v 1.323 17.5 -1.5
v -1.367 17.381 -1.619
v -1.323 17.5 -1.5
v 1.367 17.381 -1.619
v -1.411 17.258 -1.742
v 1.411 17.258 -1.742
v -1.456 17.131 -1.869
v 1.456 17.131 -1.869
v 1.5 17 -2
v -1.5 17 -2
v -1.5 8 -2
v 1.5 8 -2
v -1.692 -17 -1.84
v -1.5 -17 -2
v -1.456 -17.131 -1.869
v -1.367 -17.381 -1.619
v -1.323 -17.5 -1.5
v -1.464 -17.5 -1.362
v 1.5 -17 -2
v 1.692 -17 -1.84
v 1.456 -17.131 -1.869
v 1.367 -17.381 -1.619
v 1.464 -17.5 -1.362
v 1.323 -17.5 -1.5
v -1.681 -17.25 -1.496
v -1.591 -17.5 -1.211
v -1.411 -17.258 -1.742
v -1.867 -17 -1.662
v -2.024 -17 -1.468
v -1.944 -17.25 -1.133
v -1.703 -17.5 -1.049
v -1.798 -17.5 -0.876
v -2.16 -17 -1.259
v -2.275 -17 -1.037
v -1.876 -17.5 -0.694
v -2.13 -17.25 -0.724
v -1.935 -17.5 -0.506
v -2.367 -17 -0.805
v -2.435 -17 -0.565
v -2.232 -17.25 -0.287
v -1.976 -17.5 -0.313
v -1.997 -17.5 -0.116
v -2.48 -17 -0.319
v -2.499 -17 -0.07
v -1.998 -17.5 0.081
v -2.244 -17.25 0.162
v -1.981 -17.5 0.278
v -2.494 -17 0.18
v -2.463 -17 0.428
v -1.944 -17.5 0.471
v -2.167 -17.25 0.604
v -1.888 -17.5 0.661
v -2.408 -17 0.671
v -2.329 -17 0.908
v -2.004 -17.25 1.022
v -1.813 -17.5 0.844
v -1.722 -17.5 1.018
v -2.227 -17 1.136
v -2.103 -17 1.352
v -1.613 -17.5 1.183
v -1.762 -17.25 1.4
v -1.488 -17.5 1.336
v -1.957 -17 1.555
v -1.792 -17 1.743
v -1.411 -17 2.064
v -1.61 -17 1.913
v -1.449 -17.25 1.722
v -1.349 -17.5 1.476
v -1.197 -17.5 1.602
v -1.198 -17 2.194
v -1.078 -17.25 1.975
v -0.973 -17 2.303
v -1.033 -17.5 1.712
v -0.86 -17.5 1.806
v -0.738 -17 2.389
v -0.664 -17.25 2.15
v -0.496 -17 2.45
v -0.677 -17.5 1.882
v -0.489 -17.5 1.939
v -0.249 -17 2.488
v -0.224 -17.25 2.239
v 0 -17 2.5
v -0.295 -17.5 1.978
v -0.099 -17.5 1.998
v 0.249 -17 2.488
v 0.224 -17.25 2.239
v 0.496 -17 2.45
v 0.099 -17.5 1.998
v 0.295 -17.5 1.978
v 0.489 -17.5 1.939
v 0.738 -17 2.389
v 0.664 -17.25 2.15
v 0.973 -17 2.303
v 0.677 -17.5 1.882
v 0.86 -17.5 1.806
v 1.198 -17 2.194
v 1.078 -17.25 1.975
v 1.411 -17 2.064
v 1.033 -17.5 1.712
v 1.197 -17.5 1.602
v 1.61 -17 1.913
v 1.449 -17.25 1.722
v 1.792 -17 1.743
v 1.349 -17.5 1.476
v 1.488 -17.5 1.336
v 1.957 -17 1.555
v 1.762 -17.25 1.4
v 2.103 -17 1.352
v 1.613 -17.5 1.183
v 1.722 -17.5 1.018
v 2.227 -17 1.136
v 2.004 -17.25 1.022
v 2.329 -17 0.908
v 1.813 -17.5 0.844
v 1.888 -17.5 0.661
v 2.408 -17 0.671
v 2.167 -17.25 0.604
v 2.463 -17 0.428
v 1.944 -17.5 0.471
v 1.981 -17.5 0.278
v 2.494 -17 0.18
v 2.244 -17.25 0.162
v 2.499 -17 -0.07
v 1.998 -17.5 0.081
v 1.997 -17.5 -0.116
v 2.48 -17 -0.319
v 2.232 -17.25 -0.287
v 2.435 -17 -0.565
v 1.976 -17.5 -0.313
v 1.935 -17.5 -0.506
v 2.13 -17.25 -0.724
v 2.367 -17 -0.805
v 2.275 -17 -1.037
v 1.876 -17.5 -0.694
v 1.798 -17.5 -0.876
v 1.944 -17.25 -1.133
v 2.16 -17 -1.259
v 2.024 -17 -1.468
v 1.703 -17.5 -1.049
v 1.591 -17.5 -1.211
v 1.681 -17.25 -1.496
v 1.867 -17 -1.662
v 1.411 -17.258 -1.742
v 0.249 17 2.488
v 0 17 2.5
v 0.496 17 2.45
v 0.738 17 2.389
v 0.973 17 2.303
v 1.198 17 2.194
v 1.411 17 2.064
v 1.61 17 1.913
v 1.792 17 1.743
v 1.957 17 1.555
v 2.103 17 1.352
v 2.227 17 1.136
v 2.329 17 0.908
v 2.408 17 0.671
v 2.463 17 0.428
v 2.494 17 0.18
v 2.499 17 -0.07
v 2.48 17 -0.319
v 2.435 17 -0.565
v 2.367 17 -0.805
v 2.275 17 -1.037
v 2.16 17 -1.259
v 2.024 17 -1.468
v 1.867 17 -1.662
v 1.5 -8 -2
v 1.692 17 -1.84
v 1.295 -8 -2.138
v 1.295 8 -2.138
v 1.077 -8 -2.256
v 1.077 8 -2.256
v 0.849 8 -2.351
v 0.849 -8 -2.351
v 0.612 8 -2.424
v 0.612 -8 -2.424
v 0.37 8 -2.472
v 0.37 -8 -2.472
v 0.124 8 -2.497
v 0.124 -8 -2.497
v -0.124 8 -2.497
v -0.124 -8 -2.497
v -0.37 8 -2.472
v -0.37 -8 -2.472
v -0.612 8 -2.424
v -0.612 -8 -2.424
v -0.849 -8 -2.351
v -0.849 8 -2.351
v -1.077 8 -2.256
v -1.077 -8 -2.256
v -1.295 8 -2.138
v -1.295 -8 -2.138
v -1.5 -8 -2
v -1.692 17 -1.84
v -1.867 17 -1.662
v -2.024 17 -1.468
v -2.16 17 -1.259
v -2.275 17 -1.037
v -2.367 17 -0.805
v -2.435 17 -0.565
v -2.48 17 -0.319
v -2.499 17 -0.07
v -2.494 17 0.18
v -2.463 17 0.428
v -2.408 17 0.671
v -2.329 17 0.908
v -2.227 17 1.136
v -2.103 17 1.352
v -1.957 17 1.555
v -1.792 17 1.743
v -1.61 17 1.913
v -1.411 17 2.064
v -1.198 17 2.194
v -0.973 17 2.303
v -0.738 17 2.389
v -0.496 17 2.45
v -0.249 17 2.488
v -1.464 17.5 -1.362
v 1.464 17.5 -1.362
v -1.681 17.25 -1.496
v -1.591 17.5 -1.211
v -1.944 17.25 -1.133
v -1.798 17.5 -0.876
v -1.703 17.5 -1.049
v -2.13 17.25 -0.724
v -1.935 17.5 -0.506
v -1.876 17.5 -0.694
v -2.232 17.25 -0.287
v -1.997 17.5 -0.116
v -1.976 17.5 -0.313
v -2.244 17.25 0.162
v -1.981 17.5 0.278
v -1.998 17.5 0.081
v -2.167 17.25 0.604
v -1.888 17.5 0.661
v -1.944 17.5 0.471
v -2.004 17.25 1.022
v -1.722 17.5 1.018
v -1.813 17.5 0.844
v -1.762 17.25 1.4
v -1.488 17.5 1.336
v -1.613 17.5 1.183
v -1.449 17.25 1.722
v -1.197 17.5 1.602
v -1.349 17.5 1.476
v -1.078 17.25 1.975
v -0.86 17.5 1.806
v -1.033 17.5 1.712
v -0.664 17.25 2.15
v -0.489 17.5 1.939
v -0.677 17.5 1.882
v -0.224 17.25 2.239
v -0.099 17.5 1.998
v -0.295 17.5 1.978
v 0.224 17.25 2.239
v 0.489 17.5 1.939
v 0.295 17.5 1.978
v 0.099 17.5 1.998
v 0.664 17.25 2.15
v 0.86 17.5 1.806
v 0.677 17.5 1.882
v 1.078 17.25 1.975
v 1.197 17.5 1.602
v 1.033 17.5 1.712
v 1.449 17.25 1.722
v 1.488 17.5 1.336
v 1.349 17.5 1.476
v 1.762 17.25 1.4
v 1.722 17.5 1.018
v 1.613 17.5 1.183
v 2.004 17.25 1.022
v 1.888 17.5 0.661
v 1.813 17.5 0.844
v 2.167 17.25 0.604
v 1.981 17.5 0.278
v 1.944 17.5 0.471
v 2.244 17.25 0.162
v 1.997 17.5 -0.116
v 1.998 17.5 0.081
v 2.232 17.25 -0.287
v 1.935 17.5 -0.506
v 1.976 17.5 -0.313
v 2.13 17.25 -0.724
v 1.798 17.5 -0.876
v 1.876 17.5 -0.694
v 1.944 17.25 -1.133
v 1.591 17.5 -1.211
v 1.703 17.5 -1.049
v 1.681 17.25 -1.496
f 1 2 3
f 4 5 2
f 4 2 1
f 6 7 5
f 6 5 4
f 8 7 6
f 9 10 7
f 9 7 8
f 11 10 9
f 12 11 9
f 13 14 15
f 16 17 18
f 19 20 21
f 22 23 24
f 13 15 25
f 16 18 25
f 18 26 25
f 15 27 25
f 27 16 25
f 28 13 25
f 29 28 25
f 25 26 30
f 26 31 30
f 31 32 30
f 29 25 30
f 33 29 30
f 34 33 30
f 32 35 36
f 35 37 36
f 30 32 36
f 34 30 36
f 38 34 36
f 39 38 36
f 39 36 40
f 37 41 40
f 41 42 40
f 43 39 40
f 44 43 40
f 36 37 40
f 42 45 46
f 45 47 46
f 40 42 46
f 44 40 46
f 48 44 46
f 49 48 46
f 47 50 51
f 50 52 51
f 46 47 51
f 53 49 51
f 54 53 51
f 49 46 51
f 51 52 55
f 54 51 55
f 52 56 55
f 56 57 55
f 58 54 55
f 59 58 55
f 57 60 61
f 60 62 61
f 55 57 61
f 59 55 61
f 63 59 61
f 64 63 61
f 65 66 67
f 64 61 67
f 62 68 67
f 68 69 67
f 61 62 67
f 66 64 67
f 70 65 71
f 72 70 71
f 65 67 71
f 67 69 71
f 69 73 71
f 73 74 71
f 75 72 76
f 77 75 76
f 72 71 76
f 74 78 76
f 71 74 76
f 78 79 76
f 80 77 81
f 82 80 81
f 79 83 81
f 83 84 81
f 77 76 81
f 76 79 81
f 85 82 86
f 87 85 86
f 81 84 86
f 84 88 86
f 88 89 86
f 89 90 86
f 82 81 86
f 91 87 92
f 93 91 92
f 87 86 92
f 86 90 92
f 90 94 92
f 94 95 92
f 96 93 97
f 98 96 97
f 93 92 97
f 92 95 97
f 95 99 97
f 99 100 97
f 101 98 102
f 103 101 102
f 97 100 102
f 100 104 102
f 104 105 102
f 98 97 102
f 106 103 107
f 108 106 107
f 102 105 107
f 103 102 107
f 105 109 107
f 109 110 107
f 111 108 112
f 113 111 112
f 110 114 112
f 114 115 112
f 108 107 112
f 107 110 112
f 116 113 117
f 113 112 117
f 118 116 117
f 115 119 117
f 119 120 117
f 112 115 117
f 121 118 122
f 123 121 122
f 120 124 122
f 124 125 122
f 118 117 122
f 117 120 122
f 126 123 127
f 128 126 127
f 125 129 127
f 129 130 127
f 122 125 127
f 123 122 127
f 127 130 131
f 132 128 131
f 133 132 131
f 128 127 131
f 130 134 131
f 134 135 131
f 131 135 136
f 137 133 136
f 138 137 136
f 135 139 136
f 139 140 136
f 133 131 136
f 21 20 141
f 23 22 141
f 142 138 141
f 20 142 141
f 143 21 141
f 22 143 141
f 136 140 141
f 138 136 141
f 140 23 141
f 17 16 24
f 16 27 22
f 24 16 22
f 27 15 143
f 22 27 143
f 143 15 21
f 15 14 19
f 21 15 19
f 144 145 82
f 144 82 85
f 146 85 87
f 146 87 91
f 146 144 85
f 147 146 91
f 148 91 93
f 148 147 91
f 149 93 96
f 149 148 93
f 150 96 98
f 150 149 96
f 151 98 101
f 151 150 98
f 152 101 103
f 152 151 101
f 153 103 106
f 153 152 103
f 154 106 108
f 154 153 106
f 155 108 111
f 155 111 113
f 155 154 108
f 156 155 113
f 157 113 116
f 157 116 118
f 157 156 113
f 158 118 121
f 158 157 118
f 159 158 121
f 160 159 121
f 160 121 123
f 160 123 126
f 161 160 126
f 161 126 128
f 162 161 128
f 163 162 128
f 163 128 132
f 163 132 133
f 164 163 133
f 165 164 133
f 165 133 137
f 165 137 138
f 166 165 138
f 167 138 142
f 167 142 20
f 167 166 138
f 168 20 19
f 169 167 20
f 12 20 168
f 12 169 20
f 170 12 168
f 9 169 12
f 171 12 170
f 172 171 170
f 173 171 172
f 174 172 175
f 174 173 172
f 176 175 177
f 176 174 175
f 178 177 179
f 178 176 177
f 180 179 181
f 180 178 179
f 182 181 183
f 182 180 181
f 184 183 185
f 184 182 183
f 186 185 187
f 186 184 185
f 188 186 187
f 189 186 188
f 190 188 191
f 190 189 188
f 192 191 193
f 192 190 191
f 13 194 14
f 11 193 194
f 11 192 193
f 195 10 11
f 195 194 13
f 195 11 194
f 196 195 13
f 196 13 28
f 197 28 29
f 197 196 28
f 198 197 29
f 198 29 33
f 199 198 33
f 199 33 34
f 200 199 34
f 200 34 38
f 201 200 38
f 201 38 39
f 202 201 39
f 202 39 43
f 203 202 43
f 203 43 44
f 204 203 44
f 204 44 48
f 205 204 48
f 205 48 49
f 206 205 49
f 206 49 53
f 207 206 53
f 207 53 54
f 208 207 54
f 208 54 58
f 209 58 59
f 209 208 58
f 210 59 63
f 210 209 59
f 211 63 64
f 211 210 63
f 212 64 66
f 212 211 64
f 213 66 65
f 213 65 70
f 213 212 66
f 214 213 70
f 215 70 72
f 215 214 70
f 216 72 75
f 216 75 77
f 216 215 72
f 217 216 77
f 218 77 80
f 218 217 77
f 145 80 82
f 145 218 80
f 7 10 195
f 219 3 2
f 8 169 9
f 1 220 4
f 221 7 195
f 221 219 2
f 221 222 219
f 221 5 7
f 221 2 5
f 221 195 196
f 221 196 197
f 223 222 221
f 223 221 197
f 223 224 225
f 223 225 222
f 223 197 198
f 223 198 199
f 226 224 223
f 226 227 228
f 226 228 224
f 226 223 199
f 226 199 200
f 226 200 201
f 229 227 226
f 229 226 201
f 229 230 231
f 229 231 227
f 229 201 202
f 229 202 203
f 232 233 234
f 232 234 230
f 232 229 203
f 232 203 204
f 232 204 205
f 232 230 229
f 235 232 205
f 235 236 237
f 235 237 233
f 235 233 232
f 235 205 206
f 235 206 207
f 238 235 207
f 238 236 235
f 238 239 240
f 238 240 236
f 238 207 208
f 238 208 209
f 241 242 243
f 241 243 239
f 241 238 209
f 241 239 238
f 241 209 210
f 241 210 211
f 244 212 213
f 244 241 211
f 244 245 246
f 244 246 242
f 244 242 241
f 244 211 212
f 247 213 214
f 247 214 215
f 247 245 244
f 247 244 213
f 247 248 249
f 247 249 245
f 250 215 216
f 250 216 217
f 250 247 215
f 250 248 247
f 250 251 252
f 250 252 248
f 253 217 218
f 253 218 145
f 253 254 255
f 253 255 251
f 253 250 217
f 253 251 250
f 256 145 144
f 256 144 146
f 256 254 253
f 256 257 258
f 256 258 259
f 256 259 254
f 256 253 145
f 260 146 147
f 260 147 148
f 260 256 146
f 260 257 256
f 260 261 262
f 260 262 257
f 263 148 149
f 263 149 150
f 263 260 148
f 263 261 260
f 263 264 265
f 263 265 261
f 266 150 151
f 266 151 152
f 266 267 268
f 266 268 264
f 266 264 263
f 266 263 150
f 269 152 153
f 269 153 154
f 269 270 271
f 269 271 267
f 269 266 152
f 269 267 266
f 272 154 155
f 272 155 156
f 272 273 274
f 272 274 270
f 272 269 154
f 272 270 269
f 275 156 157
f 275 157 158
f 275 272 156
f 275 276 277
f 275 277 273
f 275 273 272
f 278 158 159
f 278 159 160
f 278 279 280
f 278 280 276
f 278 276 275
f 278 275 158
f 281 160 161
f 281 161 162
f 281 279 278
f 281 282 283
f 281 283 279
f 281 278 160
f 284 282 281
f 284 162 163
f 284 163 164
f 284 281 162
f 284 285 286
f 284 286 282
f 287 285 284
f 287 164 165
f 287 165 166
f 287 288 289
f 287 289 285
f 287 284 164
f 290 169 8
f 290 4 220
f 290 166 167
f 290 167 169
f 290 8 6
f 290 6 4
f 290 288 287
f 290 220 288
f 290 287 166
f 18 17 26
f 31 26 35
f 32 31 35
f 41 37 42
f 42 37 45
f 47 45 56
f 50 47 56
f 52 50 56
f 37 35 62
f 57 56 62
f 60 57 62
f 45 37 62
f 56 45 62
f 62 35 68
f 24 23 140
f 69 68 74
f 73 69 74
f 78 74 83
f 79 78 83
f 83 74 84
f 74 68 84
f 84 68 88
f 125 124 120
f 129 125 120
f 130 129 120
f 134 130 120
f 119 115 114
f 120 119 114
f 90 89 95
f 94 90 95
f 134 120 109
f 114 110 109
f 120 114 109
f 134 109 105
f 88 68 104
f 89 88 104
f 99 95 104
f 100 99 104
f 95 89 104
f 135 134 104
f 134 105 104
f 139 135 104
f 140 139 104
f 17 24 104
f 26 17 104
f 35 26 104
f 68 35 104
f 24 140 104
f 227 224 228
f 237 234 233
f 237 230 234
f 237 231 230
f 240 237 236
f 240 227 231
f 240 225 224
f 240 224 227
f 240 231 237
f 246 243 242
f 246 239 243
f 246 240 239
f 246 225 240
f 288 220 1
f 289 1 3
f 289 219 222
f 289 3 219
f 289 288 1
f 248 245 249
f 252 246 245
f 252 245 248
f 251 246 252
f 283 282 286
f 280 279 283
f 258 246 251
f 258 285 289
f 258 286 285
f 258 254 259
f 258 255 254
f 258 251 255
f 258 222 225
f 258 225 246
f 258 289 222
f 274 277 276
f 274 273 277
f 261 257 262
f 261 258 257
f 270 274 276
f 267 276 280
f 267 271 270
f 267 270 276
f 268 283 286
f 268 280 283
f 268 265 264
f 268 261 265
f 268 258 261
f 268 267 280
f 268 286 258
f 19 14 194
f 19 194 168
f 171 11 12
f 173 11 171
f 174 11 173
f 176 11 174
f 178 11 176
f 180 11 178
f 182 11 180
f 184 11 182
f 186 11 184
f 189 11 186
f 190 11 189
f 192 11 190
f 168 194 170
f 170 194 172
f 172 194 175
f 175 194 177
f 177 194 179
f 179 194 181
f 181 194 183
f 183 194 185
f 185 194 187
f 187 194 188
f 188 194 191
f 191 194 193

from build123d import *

# Parameters (mm, degrees)
SKETCH1_R           = 2.5
BOSS_EXTRUDE1_DEPTH = 17.5
CUT_EXTRUDE1_START  = -2
SKETCH3_W           = 5.788329994
SKETCH3_H           = 11.481307843
CUT_EXTRUDE1_DEPTH  = 35
CHAMFER1_SIZE       = 0.5


with BuildPart() as part:
    # Sketch1 → Boss-Extrude1 (new, symmetric)
    with BuildSketch(Plane(origin=(0, 0, 0), x_dir=(1, 0, 0), z_dir=(0, 1, 0))):
        with Locations(Location((0, 0, 0), (0, 0, 270))):
            Circle(SKETCH1_R)
    extrude(amount=BOSS_EXTRUDE1_DEPTH, both=True)

    # Sketch3 → Cut-Extrude1 (cut)
    with BuildSketch(Plane.XY.offset(CUT_EXTRUDE1_START)):
        with Locations((0, 13.740653921)):
            Rectangle(SKETCH3_W, SKETCH3_H)
        with Locations((0, -13.740653921)):
            Rectangle(SKETCH3_W, SKETCH3_H)
    extrude(amount=-CUT_EXTRUDE1_DEPTH, mode=Mode.SUBTRACT)

    # Chamfer1
    chamfer1_edges = [part.edges().sort_by_distance(p)[0] for p in [
        (-2.371708245, -17.5, 0.790569415),
        (0, -17.5, -2),
        (-2.371708245, 17.5, 0.790569415),
        (0, 17.5, -2),
    ]]
    chamfer(chamfer1_edges, length=CHAMFER1_SIZE - 0.0001)  # a hair under: the kernel refuses the full size


solid = part.part
